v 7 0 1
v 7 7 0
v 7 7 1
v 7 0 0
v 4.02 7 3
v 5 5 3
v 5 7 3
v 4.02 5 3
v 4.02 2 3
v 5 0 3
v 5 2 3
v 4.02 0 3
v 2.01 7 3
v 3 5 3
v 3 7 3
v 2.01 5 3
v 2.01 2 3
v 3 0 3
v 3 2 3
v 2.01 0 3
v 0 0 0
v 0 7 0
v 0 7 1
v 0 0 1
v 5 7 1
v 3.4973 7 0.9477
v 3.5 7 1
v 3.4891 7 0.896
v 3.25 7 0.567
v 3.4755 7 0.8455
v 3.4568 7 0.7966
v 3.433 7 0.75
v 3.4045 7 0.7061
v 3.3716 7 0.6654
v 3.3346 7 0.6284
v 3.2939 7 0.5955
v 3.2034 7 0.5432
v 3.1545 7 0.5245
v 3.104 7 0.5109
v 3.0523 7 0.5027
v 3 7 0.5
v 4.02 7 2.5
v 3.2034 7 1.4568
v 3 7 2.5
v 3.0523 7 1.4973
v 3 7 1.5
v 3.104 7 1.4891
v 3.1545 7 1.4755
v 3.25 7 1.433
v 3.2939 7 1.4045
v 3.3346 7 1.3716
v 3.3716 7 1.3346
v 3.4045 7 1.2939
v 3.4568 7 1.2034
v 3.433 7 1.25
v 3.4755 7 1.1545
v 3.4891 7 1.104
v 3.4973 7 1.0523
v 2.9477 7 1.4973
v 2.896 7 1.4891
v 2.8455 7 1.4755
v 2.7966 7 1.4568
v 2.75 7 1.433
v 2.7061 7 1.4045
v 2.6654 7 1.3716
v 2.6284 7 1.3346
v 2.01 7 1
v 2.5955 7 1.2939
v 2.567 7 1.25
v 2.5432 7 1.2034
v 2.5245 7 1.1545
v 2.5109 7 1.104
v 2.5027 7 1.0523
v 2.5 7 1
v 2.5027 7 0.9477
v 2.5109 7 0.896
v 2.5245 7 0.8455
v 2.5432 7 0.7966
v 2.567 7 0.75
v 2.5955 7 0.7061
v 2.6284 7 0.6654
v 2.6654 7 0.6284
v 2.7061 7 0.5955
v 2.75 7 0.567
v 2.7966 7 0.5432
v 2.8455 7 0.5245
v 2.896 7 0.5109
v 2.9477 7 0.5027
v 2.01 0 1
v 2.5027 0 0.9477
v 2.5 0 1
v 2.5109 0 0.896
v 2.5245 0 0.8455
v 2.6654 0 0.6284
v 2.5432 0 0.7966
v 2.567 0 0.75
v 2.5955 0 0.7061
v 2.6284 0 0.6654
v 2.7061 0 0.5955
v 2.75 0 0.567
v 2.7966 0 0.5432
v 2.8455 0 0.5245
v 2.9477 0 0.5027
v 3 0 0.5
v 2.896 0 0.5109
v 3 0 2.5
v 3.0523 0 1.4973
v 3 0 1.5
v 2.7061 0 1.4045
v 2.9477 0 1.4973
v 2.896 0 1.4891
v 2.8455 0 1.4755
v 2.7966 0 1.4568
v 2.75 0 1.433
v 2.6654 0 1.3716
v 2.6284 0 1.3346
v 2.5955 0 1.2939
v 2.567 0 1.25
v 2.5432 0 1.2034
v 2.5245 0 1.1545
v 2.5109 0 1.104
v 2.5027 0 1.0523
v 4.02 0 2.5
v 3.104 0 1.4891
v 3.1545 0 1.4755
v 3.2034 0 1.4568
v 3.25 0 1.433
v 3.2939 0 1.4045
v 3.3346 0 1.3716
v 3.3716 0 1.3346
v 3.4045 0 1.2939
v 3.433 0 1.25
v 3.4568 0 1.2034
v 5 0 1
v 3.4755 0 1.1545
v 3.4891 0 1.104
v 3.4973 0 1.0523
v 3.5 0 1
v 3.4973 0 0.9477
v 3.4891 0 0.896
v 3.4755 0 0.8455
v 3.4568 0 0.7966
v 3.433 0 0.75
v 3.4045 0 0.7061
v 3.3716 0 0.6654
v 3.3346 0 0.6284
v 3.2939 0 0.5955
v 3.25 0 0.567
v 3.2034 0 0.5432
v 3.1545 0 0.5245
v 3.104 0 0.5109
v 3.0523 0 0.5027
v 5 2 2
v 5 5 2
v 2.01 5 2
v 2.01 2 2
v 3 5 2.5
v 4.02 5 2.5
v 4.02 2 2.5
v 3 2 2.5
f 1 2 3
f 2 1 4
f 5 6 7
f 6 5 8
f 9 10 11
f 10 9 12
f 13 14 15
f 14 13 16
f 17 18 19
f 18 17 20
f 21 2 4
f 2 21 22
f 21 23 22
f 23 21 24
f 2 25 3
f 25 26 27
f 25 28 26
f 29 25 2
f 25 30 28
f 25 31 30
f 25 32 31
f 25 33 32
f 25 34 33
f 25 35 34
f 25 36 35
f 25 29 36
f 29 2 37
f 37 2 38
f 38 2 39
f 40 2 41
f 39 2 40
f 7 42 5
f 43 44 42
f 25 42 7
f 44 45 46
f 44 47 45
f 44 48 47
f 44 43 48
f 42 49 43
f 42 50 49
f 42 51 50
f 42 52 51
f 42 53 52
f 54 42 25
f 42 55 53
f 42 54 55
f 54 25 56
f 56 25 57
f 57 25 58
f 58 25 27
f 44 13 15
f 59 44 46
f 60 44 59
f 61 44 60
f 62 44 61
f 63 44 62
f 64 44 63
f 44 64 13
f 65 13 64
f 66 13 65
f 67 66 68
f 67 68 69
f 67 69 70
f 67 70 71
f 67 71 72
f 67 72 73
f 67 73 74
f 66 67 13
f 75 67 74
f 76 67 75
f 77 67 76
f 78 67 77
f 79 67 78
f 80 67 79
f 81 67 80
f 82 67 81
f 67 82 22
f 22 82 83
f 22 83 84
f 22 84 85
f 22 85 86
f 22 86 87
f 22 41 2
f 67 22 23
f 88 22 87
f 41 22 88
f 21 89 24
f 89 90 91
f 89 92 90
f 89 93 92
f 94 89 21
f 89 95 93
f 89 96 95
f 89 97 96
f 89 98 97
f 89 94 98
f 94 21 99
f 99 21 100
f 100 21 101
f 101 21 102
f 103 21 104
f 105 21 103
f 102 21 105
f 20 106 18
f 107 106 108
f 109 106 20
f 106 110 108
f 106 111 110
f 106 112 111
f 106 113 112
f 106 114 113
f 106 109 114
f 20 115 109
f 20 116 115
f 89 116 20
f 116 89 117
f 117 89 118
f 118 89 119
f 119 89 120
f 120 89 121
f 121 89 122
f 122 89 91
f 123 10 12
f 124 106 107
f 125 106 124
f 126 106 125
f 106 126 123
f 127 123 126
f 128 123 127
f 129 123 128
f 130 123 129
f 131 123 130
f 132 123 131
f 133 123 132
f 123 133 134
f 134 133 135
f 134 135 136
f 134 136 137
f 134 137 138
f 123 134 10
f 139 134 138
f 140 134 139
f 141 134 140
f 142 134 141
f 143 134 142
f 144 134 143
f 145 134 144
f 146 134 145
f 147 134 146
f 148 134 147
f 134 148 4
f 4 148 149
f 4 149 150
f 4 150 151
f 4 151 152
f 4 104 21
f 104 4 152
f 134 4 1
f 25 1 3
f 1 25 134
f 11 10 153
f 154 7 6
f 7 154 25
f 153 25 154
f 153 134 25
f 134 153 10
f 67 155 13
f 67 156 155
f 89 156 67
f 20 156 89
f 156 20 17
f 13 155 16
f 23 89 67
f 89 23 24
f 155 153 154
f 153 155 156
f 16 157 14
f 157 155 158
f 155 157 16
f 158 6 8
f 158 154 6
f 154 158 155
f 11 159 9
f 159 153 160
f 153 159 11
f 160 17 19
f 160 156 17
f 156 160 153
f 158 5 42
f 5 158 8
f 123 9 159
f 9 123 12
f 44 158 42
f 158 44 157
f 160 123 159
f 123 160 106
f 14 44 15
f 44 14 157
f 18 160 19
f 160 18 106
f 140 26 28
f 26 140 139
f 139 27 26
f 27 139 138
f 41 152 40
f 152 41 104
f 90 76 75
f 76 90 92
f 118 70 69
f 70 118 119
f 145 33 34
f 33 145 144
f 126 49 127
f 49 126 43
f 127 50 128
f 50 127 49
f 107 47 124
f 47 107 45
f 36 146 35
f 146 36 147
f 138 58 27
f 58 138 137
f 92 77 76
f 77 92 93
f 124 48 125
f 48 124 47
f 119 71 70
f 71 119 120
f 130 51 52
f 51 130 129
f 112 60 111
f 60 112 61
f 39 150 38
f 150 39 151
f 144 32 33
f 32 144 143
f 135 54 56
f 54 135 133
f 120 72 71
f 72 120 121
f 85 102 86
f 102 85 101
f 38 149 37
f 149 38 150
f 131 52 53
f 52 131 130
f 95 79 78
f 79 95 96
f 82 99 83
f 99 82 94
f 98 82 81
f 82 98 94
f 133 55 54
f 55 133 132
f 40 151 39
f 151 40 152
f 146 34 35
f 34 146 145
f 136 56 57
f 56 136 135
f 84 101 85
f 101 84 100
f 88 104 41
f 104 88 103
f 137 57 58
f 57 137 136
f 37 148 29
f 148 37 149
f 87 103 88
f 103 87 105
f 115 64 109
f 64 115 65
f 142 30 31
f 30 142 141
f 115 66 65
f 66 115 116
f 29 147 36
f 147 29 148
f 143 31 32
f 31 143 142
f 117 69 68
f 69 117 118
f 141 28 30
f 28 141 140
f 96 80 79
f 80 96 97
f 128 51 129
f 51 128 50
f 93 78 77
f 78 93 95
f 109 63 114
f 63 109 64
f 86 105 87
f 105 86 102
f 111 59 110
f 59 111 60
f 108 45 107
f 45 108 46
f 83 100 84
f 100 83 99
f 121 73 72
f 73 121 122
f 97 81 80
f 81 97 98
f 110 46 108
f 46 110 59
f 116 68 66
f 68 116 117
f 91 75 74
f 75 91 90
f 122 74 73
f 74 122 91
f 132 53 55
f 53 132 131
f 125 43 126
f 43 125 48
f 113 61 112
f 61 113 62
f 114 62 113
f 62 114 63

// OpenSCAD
$fn=60;
x=7;
y=7;
z=3;
difference(){
    cube([x,y,z]);
    translate([x-2,-0.01*y,1])cube([2.02,y+0.02*y,2.02]);
    translate([-0.01,-0.01*y,1])cube([2.02,y+0.02*y,2.02]);
    translate([2-0.01*x,2,2])cube([x-4+0.02*x,y-4,1.01]);
    translate([x/2-0.5,-0.01,z-0.5])cube([1.02,y+0.02*y,0.5+0.002]);
    translate(([x/2-0.5,-0.01*y,1]))rotate([-90,0,0])cylinder(h=y+0.02*y, d = 1);
}
